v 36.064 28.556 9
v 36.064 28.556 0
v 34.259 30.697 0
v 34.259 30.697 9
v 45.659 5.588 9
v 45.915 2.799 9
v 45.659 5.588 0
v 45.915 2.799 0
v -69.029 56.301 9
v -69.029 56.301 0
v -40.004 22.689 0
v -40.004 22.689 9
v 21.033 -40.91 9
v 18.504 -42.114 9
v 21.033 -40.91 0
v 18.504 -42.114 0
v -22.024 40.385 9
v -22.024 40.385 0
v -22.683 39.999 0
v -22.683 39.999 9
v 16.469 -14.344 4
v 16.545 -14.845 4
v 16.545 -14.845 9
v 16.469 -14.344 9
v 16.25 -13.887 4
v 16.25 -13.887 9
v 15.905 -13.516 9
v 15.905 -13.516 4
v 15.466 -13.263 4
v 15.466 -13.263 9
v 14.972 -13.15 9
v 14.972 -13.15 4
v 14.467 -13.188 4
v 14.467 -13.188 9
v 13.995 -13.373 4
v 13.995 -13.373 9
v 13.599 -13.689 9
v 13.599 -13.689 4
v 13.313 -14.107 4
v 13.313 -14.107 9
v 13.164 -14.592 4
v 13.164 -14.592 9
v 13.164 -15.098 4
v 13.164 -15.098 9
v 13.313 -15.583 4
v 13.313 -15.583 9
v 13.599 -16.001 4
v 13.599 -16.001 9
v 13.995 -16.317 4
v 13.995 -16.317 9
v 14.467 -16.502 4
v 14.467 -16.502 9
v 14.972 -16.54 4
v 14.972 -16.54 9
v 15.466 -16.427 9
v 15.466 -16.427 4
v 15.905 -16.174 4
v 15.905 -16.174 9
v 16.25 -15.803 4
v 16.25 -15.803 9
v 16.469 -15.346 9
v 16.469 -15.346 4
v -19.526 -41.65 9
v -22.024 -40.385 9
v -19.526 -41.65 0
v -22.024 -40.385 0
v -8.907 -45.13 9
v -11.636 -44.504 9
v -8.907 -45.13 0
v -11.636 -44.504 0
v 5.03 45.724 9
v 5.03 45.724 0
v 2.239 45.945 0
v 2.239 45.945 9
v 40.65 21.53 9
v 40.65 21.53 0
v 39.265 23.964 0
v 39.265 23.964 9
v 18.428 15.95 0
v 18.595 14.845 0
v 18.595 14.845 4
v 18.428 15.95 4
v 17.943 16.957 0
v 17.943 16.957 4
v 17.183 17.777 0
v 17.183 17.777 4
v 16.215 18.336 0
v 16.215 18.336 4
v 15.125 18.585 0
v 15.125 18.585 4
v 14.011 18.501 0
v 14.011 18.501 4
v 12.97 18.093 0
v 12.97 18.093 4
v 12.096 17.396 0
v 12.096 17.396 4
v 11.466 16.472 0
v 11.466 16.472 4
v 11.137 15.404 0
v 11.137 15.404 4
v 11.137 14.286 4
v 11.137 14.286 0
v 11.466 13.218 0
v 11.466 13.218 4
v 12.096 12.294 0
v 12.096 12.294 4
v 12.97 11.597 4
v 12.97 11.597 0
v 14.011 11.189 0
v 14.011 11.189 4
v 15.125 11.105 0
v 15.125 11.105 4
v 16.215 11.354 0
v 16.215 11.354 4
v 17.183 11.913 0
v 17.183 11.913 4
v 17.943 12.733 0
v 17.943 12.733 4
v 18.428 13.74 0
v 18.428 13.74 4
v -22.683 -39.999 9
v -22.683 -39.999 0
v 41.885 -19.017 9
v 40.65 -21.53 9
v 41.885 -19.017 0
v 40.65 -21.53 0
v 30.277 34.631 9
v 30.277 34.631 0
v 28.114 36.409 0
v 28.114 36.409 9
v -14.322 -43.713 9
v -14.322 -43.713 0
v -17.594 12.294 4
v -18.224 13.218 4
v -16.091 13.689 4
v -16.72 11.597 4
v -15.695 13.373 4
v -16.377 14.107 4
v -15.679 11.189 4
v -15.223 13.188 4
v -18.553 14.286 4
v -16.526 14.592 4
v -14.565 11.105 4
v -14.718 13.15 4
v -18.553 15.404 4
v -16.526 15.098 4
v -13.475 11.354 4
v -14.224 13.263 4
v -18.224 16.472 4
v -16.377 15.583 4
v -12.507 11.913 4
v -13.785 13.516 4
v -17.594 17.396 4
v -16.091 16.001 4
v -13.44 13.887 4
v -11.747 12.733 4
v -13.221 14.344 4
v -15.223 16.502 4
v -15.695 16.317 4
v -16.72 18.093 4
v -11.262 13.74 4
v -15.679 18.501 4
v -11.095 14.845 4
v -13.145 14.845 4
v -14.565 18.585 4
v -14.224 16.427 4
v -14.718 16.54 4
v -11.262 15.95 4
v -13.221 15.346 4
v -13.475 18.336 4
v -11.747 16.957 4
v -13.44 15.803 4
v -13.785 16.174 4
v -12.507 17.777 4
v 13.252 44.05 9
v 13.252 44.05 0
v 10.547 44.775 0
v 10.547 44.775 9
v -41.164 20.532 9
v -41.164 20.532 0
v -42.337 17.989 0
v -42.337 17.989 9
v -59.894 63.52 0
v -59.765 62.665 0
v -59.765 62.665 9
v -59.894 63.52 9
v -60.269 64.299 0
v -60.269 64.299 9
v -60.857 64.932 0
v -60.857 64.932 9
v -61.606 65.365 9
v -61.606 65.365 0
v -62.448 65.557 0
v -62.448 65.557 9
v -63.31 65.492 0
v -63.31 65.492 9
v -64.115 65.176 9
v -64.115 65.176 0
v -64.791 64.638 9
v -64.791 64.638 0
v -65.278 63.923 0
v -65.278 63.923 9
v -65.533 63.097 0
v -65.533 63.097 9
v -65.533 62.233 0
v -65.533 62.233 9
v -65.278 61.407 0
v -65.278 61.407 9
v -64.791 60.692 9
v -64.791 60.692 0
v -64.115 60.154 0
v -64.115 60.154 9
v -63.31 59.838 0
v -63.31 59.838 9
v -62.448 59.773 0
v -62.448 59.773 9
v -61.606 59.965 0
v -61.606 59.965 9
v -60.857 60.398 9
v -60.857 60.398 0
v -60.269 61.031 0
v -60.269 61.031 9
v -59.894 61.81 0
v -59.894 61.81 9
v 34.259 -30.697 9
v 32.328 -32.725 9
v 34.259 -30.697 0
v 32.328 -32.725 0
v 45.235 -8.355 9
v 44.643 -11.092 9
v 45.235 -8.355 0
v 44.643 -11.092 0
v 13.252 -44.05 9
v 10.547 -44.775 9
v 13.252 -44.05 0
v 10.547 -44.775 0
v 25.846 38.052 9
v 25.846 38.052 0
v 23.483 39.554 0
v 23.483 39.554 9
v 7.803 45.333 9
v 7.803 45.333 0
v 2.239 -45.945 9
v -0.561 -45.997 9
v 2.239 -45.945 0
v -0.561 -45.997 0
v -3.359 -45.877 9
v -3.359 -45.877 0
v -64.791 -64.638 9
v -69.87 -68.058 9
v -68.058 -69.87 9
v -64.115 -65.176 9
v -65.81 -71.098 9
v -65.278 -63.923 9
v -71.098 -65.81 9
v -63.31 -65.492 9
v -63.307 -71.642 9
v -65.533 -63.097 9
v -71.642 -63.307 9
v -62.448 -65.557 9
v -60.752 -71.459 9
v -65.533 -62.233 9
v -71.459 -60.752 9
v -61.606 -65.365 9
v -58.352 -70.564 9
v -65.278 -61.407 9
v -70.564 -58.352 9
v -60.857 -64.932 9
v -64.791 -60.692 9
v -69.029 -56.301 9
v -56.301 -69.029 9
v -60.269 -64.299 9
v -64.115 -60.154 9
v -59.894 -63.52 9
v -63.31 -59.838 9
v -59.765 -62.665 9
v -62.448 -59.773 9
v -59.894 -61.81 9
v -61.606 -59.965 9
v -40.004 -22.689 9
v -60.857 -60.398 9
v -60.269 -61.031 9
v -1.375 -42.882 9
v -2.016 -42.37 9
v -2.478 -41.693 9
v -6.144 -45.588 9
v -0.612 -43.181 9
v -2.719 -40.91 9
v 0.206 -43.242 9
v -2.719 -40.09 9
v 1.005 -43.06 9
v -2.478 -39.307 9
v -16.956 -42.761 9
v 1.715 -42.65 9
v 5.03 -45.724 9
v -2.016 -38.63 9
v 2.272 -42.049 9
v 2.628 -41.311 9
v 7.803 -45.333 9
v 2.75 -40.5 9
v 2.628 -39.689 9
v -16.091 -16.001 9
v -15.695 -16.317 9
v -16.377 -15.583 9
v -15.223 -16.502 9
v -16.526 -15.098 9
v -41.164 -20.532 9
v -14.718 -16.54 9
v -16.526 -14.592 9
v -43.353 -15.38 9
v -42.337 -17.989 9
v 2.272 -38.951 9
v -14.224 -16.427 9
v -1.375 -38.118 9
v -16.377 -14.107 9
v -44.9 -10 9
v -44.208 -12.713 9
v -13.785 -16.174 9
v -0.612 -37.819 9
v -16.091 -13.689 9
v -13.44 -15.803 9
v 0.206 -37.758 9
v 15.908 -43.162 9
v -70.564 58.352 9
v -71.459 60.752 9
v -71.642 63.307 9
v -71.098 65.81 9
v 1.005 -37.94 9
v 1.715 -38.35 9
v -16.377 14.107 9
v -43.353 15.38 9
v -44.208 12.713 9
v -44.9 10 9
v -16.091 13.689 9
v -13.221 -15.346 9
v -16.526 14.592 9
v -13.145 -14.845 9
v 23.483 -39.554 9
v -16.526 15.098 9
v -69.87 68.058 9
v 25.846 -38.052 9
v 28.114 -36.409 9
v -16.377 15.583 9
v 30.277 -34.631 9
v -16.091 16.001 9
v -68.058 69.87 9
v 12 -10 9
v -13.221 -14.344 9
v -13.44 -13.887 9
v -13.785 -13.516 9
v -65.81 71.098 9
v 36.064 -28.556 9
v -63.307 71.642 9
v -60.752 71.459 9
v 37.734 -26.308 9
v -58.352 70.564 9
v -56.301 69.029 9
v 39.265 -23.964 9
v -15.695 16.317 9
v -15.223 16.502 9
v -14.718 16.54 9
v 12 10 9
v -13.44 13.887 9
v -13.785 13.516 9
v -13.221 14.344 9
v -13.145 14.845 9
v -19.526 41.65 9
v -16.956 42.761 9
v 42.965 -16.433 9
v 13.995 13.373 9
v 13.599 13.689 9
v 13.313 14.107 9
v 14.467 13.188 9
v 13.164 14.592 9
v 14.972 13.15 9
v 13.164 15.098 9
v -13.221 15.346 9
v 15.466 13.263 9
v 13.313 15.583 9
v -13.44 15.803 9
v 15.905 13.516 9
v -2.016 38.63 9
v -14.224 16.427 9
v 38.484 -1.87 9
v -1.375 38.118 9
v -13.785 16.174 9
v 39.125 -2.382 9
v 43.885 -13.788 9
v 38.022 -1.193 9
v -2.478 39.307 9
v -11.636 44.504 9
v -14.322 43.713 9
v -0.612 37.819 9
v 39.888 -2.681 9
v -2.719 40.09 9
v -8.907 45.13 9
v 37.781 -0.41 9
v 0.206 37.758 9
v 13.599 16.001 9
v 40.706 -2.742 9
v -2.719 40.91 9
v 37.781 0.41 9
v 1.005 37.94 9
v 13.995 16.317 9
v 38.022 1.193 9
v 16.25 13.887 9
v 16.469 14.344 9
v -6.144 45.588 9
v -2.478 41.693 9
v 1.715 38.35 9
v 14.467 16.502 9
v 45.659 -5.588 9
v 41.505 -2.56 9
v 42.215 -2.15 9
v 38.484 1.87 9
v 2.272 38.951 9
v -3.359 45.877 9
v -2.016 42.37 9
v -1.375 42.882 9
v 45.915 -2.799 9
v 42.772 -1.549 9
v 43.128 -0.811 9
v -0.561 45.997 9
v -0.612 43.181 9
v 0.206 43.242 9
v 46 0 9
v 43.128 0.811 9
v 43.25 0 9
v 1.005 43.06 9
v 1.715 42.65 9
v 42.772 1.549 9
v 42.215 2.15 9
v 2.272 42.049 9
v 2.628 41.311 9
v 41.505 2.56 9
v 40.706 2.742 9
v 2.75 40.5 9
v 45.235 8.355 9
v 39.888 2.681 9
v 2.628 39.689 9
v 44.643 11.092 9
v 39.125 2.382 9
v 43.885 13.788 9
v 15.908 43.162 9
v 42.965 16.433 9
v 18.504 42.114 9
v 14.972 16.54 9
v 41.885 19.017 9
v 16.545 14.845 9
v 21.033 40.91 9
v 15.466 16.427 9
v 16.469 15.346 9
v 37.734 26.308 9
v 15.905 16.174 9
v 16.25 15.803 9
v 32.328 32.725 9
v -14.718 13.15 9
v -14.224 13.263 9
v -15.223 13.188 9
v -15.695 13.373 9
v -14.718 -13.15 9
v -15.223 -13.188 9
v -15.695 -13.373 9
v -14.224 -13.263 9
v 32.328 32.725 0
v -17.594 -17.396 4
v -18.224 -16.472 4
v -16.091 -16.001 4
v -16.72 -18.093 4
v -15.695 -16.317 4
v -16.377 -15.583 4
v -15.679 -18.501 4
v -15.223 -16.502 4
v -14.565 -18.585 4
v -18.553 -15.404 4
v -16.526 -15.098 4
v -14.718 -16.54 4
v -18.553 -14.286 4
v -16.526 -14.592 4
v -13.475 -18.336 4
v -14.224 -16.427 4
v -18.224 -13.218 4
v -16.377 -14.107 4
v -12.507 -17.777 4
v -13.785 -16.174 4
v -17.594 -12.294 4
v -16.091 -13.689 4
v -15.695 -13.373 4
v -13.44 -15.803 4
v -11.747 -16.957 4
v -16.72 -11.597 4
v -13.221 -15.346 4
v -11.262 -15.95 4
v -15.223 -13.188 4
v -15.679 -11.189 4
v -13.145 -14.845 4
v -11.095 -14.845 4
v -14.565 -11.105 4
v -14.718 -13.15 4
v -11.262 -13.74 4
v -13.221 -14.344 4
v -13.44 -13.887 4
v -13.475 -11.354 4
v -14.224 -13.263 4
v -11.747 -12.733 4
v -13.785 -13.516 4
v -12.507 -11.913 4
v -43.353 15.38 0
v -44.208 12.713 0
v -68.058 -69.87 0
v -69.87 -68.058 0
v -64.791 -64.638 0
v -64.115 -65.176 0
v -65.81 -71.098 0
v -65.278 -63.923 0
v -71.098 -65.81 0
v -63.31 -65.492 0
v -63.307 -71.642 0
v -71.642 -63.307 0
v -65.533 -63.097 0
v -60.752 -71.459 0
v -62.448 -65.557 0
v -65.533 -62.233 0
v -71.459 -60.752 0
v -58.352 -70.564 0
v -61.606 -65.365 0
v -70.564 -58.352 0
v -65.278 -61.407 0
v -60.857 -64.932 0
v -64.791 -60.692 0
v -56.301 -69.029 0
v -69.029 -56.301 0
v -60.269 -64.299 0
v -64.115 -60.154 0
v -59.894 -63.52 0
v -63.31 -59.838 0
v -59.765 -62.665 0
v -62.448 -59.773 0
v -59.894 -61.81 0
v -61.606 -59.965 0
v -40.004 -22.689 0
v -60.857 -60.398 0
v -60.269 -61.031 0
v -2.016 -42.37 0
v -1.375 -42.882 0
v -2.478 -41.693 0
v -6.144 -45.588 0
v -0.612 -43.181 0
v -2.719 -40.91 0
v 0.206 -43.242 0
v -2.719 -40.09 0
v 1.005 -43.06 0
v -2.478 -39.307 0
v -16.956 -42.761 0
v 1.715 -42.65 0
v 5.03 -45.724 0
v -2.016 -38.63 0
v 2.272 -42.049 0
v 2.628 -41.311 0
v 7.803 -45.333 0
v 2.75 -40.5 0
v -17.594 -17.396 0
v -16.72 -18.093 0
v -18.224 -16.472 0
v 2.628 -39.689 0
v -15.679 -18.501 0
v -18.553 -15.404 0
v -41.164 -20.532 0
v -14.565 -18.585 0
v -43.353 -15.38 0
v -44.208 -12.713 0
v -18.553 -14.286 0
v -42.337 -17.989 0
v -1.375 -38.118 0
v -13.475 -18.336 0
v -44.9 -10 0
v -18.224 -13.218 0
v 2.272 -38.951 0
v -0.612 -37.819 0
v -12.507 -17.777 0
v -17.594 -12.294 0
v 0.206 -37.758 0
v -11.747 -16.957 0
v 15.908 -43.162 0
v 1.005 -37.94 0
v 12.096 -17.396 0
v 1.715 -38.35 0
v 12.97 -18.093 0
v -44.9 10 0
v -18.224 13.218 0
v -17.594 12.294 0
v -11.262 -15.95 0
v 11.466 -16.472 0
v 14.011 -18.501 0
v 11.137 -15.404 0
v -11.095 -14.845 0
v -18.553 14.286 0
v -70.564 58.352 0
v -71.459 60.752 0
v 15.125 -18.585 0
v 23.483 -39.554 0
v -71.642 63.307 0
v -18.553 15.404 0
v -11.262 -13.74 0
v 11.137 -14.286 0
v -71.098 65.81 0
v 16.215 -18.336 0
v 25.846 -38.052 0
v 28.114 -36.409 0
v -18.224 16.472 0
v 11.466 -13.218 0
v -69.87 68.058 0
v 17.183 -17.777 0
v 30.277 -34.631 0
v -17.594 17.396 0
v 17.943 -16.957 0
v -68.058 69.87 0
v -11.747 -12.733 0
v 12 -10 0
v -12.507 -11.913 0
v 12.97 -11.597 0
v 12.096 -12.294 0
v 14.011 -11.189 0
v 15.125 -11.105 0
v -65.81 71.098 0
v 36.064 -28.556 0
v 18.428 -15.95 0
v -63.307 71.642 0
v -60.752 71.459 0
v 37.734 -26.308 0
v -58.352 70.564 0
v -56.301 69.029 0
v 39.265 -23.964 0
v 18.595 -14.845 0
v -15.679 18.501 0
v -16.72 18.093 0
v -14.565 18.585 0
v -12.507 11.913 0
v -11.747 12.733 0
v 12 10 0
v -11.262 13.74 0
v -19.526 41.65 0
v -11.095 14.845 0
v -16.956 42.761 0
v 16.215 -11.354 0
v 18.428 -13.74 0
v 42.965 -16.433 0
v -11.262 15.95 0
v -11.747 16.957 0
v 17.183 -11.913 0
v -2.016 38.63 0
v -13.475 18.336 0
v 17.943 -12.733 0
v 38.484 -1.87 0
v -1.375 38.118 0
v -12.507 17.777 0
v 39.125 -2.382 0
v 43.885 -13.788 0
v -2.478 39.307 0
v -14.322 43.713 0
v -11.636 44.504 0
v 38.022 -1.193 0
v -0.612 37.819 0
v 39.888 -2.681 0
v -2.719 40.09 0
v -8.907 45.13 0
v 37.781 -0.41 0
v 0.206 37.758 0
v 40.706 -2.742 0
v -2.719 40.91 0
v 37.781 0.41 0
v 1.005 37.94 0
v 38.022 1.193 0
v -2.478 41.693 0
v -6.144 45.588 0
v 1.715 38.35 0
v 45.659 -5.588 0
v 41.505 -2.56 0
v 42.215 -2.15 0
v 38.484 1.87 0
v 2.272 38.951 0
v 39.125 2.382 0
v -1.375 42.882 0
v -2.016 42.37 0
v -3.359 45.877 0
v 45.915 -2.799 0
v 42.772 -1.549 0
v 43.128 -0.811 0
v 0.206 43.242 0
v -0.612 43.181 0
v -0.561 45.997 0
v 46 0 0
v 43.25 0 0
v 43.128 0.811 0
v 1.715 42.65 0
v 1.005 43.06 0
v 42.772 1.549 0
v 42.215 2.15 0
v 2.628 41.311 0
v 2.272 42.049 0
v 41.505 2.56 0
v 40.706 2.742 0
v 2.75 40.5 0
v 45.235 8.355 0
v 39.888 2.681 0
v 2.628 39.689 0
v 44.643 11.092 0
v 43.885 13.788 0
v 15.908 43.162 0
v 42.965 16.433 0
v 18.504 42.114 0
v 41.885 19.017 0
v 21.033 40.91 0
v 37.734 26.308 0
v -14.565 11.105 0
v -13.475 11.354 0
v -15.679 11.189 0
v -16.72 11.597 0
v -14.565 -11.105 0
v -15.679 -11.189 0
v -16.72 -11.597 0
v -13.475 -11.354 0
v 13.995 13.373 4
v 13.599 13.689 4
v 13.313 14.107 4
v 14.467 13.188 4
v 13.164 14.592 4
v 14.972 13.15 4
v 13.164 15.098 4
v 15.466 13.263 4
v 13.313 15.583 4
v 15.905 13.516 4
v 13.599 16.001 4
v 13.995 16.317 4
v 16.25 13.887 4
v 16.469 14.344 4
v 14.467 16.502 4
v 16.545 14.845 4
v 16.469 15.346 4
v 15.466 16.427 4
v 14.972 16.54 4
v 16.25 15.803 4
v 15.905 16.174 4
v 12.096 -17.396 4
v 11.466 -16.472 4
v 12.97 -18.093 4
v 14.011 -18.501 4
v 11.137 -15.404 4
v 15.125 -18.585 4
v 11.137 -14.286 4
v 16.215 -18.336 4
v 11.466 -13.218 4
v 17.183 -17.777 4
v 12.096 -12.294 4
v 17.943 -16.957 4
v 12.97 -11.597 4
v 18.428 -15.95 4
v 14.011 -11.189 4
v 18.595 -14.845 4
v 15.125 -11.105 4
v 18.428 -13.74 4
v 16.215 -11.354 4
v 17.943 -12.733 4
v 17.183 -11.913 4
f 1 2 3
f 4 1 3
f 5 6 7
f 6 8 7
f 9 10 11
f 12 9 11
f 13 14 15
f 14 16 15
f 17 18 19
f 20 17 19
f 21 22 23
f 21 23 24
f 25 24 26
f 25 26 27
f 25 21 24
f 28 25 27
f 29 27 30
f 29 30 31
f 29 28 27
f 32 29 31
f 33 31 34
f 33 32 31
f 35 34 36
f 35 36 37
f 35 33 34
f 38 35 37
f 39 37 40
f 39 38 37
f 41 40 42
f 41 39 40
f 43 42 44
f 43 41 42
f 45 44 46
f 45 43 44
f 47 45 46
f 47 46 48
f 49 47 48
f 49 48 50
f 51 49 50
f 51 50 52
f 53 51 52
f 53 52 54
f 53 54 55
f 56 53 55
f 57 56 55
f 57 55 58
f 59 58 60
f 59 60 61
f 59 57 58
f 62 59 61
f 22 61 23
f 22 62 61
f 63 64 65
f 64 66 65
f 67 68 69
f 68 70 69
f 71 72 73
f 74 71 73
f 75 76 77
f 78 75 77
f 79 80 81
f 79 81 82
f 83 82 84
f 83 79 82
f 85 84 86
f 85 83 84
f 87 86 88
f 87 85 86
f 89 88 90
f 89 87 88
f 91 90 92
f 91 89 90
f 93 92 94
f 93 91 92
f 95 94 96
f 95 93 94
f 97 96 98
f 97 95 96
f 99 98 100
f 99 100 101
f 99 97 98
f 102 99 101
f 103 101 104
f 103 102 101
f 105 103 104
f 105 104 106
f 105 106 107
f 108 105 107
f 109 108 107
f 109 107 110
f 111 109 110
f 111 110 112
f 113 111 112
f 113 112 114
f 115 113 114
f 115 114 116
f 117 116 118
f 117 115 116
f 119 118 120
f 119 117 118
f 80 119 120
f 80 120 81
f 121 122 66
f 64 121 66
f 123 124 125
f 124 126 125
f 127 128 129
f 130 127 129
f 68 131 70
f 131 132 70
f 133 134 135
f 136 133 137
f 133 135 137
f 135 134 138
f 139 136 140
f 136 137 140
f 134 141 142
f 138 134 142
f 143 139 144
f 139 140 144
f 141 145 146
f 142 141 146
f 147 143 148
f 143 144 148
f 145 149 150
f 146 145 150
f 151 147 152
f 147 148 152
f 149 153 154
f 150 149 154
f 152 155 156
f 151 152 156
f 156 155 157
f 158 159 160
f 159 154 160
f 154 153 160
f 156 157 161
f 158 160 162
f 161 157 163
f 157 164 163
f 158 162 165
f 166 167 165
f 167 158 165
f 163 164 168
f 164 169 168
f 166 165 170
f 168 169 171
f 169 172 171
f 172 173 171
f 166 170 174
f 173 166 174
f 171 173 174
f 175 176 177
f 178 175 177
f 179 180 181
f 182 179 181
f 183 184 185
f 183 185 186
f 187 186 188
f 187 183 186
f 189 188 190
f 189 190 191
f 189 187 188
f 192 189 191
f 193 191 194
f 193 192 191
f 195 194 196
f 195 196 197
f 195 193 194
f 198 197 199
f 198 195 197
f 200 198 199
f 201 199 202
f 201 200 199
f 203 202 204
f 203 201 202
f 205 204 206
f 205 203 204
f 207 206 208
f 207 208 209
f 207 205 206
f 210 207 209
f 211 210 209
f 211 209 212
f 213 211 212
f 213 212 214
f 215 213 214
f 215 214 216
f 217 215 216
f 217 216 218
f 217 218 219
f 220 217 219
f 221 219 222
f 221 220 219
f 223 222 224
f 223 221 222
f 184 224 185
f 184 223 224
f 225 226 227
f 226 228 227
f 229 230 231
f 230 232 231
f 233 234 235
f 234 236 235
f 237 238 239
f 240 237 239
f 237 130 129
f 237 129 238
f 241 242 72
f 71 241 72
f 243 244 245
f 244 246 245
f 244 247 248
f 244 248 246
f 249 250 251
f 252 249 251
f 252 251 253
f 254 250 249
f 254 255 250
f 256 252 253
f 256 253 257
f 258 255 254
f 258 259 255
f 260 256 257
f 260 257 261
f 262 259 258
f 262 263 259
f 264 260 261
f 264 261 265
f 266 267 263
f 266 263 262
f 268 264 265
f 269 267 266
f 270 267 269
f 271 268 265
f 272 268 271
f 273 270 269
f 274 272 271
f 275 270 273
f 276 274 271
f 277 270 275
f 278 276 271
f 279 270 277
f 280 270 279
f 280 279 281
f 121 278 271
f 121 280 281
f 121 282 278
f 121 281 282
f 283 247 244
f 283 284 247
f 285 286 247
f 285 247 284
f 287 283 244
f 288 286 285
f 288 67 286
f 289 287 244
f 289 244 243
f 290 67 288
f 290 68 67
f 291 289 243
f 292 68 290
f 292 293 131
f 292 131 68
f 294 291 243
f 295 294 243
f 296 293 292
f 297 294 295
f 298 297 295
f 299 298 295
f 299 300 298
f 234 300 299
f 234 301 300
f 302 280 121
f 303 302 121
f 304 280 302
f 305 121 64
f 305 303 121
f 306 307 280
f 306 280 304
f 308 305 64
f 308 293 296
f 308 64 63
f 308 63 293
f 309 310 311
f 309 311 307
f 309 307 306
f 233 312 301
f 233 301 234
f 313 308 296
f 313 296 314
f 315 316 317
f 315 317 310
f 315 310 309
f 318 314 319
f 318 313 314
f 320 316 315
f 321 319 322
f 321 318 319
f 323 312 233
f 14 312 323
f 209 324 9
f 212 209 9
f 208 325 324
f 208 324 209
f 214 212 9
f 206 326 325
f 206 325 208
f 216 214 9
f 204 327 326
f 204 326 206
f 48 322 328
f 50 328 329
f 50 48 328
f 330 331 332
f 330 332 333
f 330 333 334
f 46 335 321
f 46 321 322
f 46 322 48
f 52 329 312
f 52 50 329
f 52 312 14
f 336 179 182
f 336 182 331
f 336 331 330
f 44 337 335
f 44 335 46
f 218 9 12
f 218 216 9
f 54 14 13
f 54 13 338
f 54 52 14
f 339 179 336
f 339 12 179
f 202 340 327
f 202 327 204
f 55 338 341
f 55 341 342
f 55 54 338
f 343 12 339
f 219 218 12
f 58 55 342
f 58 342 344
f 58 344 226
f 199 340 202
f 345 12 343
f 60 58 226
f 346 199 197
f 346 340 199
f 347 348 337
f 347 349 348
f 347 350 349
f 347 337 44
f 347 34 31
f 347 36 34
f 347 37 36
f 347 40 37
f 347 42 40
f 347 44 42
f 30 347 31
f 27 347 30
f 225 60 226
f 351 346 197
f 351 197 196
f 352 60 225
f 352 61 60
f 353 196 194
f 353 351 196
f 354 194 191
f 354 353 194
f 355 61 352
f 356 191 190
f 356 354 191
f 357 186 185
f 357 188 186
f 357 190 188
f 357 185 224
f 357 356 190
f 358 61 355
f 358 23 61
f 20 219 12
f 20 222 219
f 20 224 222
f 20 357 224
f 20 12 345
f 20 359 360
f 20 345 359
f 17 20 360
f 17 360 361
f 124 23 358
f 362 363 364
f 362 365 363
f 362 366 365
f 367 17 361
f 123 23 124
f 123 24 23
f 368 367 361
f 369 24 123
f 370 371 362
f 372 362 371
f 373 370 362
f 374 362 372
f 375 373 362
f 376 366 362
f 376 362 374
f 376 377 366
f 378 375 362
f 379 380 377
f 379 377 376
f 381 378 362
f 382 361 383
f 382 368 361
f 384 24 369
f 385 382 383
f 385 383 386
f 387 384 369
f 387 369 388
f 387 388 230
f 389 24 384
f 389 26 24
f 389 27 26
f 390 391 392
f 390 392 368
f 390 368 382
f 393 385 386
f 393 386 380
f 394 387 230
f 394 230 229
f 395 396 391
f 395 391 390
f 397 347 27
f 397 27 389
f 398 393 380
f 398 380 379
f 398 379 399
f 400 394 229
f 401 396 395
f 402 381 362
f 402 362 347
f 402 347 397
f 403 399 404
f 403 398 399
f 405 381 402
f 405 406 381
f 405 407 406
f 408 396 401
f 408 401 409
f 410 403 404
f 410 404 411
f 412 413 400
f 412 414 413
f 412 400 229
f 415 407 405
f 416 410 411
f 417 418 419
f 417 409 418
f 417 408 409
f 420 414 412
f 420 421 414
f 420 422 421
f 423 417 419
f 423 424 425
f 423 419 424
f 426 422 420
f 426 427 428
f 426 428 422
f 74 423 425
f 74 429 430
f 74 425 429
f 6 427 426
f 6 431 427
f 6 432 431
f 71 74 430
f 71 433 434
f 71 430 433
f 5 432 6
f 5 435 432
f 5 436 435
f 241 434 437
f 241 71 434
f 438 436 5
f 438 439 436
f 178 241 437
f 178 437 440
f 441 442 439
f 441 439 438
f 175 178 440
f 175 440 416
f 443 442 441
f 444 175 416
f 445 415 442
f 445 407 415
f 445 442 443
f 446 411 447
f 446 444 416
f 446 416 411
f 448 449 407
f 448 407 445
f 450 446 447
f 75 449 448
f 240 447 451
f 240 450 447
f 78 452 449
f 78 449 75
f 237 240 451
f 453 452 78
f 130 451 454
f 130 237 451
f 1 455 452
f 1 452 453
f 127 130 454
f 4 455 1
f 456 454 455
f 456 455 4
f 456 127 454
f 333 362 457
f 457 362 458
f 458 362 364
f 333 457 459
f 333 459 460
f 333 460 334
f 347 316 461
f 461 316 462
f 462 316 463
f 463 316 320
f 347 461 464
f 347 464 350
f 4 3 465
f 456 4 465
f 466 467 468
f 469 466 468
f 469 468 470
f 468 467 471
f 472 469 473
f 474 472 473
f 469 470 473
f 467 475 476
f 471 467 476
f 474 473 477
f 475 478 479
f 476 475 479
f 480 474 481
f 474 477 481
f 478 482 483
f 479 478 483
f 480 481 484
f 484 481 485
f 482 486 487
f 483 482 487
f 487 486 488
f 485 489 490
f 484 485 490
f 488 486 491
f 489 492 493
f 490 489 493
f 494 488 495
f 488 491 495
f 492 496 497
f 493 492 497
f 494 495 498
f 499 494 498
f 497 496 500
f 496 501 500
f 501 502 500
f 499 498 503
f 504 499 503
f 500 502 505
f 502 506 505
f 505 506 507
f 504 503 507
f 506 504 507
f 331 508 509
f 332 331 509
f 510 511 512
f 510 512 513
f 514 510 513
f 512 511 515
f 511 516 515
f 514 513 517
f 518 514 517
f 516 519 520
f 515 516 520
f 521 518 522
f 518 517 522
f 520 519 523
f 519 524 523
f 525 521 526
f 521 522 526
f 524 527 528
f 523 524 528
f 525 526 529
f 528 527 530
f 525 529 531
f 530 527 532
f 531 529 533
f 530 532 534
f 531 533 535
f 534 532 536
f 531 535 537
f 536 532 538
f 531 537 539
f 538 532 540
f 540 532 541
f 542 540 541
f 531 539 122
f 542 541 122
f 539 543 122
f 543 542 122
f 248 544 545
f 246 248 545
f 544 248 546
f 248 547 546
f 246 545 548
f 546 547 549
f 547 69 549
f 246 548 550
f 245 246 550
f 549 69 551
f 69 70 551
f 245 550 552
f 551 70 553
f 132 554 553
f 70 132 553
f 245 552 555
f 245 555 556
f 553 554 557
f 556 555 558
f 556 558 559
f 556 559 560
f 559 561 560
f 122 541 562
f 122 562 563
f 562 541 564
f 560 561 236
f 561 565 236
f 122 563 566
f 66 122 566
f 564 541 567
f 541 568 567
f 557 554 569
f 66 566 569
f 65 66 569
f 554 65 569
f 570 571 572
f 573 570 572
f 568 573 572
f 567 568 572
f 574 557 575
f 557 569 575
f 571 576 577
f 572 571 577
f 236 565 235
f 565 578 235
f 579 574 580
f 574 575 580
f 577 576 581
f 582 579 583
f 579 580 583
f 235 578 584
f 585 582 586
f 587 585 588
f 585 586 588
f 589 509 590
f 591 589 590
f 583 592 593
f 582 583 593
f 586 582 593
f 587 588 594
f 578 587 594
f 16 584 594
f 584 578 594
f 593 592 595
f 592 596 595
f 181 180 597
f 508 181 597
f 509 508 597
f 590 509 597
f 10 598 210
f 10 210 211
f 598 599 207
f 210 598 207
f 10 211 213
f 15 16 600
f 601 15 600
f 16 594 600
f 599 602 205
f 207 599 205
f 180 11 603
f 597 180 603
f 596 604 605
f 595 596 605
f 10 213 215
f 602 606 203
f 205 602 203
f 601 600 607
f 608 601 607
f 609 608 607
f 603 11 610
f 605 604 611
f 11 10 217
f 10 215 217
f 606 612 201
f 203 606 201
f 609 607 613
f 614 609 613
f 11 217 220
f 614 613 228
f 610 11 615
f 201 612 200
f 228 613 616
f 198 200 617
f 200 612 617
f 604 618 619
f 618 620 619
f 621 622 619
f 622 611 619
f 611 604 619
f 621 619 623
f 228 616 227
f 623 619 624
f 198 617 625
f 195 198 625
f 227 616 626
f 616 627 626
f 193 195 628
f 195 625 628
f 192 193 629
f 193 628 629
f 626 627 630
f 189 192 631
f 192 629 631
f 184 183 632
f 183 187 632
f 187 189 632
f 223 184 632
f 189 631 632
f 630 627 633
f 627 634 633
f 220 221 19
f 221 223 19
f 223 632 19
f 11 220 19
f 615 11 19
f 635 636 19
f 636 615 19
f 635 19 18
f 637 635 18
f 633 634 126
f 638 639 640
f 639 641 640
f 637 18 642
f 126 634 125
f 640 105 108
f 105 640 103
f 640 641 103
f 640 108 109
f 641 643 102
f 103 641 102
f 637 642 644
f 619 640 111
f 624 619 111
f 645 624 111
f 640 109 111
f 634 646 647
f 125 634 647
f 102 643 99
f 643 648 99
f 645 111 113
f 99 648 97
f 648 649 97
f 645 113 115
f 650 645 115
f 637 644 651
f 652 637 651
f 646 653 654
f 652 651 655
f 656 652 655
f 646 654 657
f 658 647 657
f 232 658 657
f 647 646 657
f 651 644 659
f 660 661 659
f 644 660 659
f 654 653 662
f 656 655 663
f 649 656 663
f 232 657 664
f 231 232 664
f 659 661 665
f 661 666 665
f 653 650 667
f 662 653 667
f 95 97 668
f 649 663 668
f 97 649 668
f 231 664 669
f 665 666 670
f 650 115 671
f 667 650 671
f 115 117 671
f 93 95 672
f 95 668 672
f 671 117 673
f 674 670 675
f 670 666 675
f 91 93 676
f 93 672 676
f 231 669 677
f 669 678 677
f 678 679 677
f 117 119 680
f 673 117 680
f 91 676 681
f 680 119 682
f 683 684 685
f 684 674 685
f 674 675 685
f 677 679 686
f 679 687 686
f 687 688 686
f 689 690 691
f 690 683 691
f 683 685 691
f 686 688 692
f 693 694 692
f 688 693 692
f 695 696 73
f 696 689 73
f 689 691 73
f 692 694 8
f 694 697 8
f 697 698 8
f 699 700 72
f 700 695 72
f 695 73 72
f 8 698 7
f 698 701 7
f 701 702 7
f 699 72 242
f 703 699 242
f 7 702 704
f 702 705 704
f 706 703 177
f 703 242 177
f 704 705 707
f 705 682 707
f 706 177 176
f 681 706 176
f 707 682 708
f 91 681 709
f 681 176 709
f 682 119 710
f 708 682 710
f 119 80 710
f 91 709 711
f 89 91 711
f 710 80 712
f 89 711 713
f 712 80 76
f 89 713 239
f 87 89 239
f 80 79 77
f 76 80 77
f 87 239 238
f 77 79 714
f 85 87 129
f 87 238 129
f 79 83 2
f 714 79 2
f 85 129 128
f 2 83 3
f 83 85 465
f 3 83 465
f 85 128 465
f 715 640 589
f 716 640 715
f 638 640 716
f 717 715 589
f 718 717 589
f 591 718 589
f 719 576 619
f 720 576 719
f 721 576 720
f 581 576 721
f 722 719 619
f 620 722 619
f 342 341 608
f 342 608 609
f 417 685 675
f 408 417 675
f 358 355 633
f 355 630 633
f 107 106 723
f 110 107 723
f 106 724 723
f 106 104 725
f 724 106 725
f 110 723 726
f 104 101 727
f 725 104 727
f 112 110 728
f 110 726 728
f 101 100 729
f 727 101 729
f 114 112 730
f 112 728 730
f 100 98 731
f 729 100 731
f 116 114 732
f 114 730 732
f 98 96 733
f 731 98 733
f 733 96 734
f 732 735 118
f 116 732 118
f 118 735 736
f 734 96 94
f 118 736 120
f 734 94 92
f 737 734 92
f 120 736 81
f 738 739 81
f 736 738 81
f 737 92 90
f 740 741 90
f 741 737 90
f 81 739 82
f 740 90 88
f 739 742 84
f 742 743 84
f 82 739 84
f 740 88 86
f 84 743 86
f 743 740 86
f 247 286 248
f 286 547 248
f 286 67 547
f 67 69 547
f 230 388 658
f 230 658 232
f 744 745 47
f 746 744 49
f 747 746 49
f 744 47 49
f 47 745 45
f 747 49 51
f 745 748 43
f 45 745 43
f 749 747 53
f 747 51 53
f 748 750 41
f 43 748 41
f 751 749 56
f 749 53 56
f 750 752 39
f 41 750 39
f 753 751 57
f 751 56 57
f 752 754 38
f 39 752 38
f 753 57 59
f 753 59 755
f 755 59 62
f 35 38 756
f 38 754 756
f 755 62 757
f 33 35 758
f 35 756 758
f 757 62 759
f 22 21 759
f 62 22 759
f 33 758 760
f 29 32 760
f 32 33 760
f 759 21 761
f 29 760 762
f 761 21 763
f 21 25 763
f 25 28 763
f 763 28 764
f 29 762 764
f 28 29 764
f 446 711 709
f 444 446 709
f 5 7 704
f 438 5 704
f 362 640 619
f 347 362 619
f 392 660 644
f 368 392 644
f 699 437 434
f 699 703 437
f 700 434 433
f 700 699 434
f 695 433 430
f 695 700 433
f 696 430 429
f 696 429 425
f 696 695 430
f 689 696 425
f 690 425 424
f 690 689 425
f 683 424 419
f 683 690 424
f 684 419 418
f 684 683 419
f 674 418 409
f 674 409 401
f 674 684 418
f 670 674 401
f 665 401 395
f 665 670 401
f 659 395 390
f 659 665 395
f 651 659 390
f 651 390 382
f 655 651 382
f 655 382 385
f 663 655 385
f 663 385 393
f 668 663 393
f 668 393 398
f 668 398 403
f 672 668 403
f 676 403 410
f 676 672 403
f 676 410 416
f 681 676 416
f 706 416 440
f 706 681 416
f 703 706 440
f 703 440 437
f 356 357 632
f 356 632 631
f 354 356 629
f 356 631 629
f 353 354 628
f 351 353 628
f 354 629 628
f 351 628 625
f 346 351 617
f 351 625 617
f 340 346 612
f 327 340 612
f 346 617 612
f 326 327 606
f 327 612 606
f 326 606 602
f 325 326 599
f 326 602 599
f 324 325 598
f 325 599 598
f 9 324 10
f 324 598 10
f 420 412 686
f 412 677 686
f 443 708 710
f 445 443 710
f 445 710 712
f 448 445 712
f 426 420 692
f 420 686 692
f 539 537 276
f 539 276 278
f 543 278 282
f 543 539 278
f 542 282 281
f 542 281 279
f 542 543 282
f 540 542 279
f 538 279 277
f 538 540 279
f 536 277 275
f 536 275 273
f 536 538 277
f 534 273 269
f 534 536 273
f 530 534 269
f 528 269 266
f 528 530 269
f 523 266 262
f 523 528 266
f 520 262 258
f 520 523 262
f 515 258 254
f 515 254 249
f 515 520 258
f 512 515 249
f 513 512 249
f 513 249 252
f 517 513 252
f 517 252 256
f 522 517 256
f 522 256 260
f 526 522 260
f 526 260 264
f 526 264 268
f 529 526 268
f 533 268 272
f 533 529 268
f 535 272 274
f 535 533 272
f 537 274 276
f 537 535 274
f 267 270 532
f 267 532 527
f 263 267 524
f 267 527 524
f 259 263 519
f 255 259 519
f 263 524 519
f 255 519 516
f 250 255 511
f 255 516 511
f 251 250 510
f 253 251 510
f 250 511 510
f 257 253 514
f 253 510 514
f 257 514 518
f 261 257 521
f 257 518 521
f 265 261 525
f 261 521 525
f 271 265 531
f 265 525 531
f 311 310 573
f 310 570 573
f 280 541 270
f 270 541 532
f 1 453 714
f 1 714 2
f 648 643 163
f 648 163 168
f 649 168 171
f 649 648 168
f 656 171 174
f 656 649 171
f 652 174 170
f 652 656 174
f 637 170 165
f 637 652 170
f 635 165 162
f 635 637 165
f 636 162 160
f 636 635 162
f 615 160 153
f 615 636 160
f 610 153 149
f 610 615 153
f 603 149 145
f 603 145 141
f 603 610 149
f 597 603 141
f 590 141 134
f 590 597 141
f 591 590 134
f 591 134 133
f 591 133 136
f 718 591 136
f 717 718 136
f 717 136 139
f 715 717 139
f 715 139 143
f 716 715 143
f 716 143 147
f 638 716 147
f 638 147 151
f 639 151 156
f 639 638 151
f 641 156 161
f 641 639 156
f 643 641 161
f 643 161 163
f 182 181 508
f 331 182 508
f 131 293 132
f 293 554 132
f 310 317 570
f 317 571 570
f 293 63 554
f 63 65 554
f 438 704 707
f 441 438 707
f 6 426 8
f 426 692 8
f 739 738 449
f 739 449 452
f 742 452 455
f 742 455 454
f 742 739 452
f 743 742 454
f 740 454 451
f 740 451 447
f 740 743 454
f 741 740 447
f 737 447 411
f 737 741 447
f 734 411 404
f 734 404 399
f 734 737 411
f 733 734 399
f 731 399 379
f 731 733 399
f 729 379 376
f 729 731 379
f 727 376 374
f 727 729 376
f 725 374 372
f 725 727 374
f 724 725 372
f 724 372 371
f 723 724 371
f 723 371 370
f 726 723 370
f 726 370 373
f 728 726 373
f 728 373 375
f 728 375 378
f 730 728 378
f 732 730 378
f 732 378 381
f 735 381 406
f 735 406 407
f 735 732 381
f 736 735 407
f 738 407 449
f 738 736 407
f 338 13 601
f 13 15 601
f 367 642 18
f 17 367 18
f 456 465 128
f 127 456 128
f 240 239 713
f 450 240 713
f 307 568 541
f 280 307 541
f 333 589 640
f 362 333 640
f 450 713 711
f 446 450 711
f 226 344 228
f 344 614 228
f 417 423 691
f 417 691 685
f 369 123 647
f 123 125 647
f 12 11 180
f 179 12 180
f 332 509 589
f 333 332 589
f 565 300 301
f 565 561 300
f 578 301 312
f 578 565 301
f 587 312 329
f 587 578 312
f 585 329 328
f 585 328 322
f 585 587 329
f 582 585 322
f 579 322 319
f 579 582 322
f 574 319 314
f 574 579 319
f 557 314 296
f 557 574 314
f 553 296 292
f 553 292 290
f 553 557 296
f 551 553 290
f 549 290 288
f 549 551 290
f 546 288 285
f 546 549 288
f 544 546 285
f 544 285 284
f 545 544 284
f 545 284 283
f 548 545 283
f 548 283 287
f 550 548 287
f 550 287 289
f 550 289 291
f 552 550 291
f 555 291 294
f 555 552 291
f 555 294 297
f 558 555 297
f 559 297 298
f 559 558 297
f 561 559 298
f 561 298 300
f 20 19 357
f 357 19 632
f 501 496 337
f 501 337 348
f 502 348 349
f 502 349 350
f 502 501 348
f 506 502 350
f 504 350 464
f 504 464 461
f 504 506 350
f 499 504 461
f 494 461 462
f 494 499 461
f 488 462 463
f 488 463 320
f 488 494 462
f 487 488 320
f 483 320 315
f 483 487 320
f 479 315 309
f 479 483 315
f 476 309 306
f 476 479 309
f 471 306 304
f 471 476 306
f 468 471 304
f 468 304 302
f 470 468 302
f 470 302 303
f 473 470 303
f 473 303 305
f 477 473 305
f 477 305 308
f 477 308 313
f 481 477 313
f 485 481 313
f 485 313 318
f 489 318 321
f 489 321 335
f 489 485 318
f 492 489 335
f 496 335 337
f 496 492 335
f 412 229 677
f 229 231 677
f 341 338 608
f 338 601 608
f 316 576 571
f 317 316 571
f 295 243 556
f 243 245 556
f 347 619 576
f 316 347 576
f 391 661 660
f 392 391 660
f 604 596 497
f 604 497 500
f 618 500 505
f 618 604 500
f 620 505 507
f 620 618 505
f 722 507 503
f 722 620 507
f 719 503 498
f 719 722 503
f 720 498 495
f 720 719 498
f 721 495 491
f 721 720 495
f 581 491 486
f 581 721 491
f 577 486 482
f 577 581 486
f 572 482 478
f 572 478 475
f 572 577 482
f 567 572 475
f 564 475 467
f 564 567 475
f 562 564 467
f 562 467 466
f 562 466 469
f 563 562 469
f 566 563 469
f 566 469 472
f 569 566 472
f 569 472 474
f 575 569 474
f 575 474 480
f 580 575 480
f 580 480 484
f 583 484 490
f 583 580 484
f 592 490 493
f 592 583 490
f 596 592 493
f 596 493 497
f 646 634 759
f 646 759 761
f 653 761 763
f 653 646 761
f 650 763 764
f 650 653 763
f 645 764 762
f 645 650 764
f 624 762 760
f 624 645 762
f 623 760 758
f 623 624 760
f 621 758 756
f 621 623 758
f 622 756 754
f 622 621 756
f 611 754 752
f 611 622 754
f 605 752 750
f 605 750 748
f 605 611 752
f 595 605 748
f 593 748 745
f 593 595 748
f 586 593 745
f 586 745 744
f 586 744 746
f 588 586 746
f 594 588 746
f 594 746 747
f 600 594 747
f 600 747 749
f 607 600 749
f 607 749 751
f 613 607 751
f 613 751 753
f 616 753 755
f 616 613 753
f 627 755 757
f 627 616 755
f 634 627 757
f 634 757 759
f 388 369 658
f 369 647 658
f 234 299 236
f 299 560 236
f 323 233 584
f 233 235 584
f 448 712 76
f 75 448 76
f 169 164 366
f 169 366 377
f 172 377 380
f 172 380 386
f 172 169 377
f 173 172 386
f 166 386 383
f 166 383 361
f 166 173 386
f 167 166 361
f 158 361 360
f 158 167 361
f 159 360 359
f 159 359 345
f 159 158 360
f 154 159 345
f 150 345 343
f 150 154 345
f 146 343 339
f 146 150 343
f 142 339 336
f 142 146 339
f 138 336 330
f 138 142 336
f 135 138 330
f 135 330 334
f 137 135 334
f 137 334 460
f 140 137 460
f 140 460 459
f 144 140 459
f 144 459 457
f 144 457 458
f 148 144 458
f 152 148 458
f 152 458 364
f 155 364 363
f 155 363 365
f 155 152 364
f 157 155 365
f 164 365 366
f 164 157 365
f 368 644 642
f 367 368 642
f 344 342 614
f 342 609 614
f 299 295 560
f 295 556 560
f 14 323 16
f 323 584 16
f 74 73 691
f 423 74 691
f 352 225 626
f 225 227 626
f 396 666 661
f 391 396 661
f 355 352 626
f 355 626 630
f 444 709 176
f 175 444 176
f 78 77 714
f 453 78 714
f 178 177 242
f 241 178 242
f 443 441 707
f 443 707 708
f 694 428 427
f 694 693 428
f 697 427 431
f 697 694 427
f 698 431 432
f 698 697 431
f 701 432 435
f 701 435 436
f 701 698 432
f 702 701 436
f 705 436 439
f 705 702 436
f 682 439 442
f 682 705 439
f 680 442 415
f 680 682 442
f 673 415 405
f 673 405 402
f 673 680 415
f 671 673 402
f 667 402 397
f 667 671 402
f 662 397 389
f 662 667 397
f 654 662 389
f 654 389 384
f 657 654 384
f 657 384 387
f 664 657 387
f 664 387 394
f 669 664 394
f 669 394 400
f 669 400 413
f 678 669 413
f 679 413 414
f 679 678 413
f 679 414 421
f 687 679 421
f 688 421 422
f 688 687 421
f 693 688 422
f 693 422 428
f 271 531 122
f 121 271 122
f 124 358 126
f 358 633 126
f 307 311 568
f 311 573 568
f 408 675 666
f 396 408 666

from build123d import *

# Parameters (mm, degrees)
SKETCH_1_R          = 3.75
SKETCH_1_R_2        = 2.75
EXTRUDE_436_DEPTH   = 4
EXTRUDE_START       = 4
SKETCH_2_R          = 1.7
SKETCH_2_R_2        = 2.75
EXTRUDE_712_DEPTH   = 5
SKETCH_3_R          = 2.9
EXTRUDE_5_8_DEPTH   = 9
SKETCH_4_R          = 2.9
EXTRUDE_5_8_2_DEPTH = 9


with BuildPart() as part:
    # 草图1 → Extrude 436 (new body)
    with BuildSketch(Plane.XY):
        Polygon((-44.899888641, -10), (-44.2082264, -12.713485699), (-43.352738806, -15.379858192), (-42.336596099, -17.989236526), (-41.163563864, -20.531950955), (-39.837989085, -22.998578775), (-38.364784033, -25.379979238), (-36.74940806, -27.667327432), (-34.997847373, -29.852146979), (-33.116592846, -31.926341448), (-31.112615968, -33.882224361), (-28.993343009, -35.712547671), (-26.7666275, -37.410528629), (-24.440721127, -38.969874914), (-22.024243155, -40.384807953), (-19.526148488, -41.650084336), (-16.955694479, -42.761015244), (-14.322406631, -43.713483827), (-11.636043292, -44.503960459), (-8.906559497, -45.129515818), (-6.144070075, -45.587831742), (-3.358812166, -45.87720982), (-0.561107284, -45.996577684), (2.238676931, -45.945492985), (5.030165132, -45.72414503), (7.803012717, -45.333354084), (10.546944161, -44.774568327), (13.251791096, -44.049858487), (15.907529991, -43.161910171), (18.504319299, -42.114013906), (21.032535927, -40.910052952), (23.482810893, -39.554488905), (25.846064052, -38.052345171), (28.11353774, -36.409188342), (30.276829231, -34.631107573), (32.327921871, -32.724692016), (34.25921479, -30.697006401), (36.063551069, -28.555564857), (37.734244259, -26.308303066), (39.265103162, -23.963548854), (40.650454772, -21.529991333), (41.885165301, -19.016648698), (42.9646592, -16.432834808), (43.884936117, -13.788124675), (44.64258572, -11.092318975), (45.234800338, -8.355407734), (45.659385361, -5.587533306), (45.914767377, -2.798952785), (46, 0), (45.914767377, 2.798952785), (45.659385361, 5.587533306), (45.234800338, 8.355407734), (44.64258572, 11.092318975), (43.884936117, 13.788124675), (42.9646592, 16.432834808), (41.885165301, 19.016648698), (40.650454772, 21.529991333), (39.265103162, 23.963548854), (37.734244259, 26.308303066), (36.063551069, 28.555564857), (34.25921479, 30.697006401), (32.327921871, 32.724692016), (30.276829231, 34.631107573), (28.11353774, 36.409188342), (25.846064052, 38.052345171), (23.482810893, 39.554488905), (21.032535927, 40.910052952), (18.504319299, 42.114013906), (15.907529991, 43.161910171), (13.251791096, 44.049858487), (10.546944161, 44.774568327), (7.803012717, 45.333354084), (5.030165132, 45.72414503), (2.238676931, 45.945492985), (-0.561107284, 45.996577684), (-3.358812166, 45.87720982), (-6.144070075, 45.587831742), (-8.906559497, 45.129515818), (-11.636043292, 44.503960459), (-14.322406631, 43.713483827), (-16.955694479, 42.761015244), (-19.526148488, 41.650084336), (-22.024243155, 40.384807953), (-24.440721127, 38.969874914), (-26.7666275, 37.410528629), (-28.993343009, 35.712547671), (-31.112615968, 33.882224361), (-33.116592846, 31.926341448), (-34.997847373, 29.852146979), (-36.74940806, 27.667327432), (-38.364784033, 25.379979238), (-39.837989085, 22.998578775), (-41.163563864, 20.531950955), (-42.336596099, 17.989236526), (-43.352738806, 15.379858192), (-44.2082264, 12.713485699), (-44.899888641, 10), (12, 10), (12, -10), align=None)
        with Locations((-14.845, -14.845)):
            Circle(SKETCH_1_R, mode=Mode.SUBTRACT)
        with Locations((-14.845, 14.845)):
            Circle(SKETCH_1_R, mode=Mode.SUBTRACT)
        with Locations((14.845, -14.845)):
            Circle(SKETCH_1_R, mode=Mode.SUBTRACT)
        with Locations((14.845, 14.845)):
            Circle(SKETCH_1_R, mode=Mode.SUBTRACT)
        with Locations((0, -40.5)):
            Circle(SKETCH_1_R_2, mode=Mode.SUBTRACT)
        with Locations((0, 40.5)):
            Circle(SKETCH_1_R_2, mode=Mode.SUBTRACT)
        with Locations((40.5, 0)):
            Circle(SKETCH_1_R_2, mode=Mode.SUBTRACT)
    extrude(amount=EXTRUDE_436_DEPTH)

    # 草图2 → Extrude 712 (add)
    with BuildSketch(Plane.XY.offset(EXTRUDE_START)):
        Polygon((-44.899888641, -10), (-44.2082264, -12.713485699), (-43.352738806, -15.379858192), (-42.336596099, -17.989236526), (-41.163563864, -20.531950955), (-39.837989085, -22.998578775), (-38.364784033, -25.379979238), (-36.74940806, -27.667327432), (-34.997847373, -29.852146979), (-33.116592846, -31.926341448), (-31.112615968, -33.882224361), (-28.993343009, -35.712547671), (-26.7666275, -37.410528629), (-24.440721127, -38.969874914), (-22.024243155, -40.384807953), (-19.526148488, -41.650084336), (-16.955694479, -42.761015244), (-14.322406631, -43.713483827), (-11.636043292, -44.503960459), (-8.906559497, -45.129515818), (-6.144070075, -45.587831742), (-3.358812166, -45.87720982), (-0.561107284, -45.996577684), (2.238676931, -45.945492985), (5.030165132, -45.72414503), (7.803012717, -45.333354084), (10.546944161, -44.774568327), (13.251791096, -44.049858487), (15.907529991, -43.161910171), (18.504319299, -42.114013906), (21.032535927, -40.910052952), (23.482810893, -39.554488905), (25.846064052, -38.052345171), (28.11353774, -36.409188342), (30.276829231, -34.631107573), (32.327921871, -32.724692016), (34.25921479, -30.697006401), (36.063551069, -28.555564857), (37.734244259, -26.308303066), (39.265103162, -23.963548854), (40.650454772, -21.529991333), (41.885165301, -19.016648698), (42.9646592, -16.432834808), (43.884936117, -13.788124675), (44.64258572, -11.092318975), (45.234800338, -8.355407734), (45.659385361, -5.587533306), (45.914767377, -2.798952785), (46, 0), (45.914767377, 2.798952785), (45.659385361, 5.587533306), (45.234800338, 8.355407734), (44.64258572, 11.092318975), (43.884936117, 13.788124675), (42.9646592, 16.432834808), (41.885165301, 19.016648698), (40.650454772, 21.529991333), (39.265103162, 23.963548854), (37.734244259, 26.308303066), (36.063551069, 28.555564857), (34.25921479, 30.697006401), (32.327921871, 32.724692016), (30.276829231, 34.631107573), (28.11353774, 36.409188342), (25.846064052, 38.052345171), (23.482810893, 39.554488905), (21.032535927, 40.910052952), (18.504319299, 42.114013906), (15.907529991, 43.161910171), (13.251791096, 44.049858487), (10.546944161, 44.774568327), (7.803012717, 45.333354084), (5.030165132, 45.72414503), (2.238676931, 45.945492985), (-0.561107284, 45.996577684), (-3.358812166, 45.87720982), (-6.144070075, 45.587831742), (-8.906559497, 45.129515818), (-11.636043292, 44.503960459), (-14.322406631, 43.713483827), (-16.955694479, 42.761015244), (-19.526148488, 41.650084336), (-22.024243155, 40.384807953), (-24.440721127, 38.969874914), (-26.7666275, 37.410528629), (-28.993343009, 35.712547671), (-31.112615968, 33.882224361), (-33.116592846, 31.926341448), (-34.997847373, 29.852146979), (-36.74940806, 27.667327432), (-38.364784033, 25.379979238), (-39.837989085, 22.998578775), (-41.163563864, 20.531950955), (-42.336596099, 17.989236526), (-43.352738806, 15.379858192), (-44.2082264, 12.713485699), (-44.899888641, 10), (12, 10), (12, -10), align=None)
        with Locations((-14.845, -14.845)):
            Circle(SKETCH_2_R, mode=Mode.SUBTRACT)
        with Locations((-14.845, 14.845)):
            Circle(SKETCH_2_R, mode=Mode.SUBTRACT)
        with Locations((14.845, -14.845)):
            Circle(SKETCH_2_R, mode=Mode.SUBTRACT)
        with Locations((14.845, 14.845)):
            Circle(SKETCH_2_R, mode=Mode.SUBTRACT)
        with Locations((0, -40.5)):
            Circle(SKETCH_2_R_2, mode=Mode.SUBTRACT)
        with Locations((0, 40.5)):
            Circle(SKETCH_2_R_2, mode=Mode.SUBTRACT)
        with Locations((40.5, 0)):
            Circle(SKETCH_2_R_2, mode=Mode.SUBTRACT)
    extrude(amount=EXTRUDE_712_DEPTH)

    # 草图3 → Extrude 5.8 (add)
    with BuildSketch(Plane.XY):
        with BuildLine():
            Line((-33.234018716, -14.849242405), (-69.028961031, -56.301038969))
            ThreePointArc((-69.028961031, -56.301038969), (-69.028961031, -69.028961031), (-56.301038969, -69.028961031))
            Line((-56.301038969, -69.028961031), (-14.849242405, -33.234018716))
            Line((-14.849242405, -33.234018716), (-33.234018716, -14.849242405))
        make_face()
        with Locations((-62.665, -62.665)):
            Circle(SKETCH_3_R, mode=Mode.SUBTRACT)
    extrude(amount=EXTRUDE_5_8_DEPTH)

    # 草图4 → Extrude 5.8 2 (add)
    with BuildSketch(Plane.XY):
        with BuildLine():
            Line((-14.849242405, 33.234018716), (-56.301038969, 69.028961031))
            ThreePointArc((-56.301038969, 69.028961031), (-69.028961031, 69.028961031), (-69.028961031, 56.301038969))
            Line((-69.028961031, 56.301038969), (-33.234018716, 14.849242405))
            Line((-33.234018716, 14.849242405), (-14.849242405, 33.234018716))
        make_face()
        with Locations((-62.665, 62.665)):
            Circle(SKETCH_4_R, mode=Mode.SUBTRACT)
    extrude(amount=EXTRUDE_5_8_2_DEPTH)


solid = part.part
